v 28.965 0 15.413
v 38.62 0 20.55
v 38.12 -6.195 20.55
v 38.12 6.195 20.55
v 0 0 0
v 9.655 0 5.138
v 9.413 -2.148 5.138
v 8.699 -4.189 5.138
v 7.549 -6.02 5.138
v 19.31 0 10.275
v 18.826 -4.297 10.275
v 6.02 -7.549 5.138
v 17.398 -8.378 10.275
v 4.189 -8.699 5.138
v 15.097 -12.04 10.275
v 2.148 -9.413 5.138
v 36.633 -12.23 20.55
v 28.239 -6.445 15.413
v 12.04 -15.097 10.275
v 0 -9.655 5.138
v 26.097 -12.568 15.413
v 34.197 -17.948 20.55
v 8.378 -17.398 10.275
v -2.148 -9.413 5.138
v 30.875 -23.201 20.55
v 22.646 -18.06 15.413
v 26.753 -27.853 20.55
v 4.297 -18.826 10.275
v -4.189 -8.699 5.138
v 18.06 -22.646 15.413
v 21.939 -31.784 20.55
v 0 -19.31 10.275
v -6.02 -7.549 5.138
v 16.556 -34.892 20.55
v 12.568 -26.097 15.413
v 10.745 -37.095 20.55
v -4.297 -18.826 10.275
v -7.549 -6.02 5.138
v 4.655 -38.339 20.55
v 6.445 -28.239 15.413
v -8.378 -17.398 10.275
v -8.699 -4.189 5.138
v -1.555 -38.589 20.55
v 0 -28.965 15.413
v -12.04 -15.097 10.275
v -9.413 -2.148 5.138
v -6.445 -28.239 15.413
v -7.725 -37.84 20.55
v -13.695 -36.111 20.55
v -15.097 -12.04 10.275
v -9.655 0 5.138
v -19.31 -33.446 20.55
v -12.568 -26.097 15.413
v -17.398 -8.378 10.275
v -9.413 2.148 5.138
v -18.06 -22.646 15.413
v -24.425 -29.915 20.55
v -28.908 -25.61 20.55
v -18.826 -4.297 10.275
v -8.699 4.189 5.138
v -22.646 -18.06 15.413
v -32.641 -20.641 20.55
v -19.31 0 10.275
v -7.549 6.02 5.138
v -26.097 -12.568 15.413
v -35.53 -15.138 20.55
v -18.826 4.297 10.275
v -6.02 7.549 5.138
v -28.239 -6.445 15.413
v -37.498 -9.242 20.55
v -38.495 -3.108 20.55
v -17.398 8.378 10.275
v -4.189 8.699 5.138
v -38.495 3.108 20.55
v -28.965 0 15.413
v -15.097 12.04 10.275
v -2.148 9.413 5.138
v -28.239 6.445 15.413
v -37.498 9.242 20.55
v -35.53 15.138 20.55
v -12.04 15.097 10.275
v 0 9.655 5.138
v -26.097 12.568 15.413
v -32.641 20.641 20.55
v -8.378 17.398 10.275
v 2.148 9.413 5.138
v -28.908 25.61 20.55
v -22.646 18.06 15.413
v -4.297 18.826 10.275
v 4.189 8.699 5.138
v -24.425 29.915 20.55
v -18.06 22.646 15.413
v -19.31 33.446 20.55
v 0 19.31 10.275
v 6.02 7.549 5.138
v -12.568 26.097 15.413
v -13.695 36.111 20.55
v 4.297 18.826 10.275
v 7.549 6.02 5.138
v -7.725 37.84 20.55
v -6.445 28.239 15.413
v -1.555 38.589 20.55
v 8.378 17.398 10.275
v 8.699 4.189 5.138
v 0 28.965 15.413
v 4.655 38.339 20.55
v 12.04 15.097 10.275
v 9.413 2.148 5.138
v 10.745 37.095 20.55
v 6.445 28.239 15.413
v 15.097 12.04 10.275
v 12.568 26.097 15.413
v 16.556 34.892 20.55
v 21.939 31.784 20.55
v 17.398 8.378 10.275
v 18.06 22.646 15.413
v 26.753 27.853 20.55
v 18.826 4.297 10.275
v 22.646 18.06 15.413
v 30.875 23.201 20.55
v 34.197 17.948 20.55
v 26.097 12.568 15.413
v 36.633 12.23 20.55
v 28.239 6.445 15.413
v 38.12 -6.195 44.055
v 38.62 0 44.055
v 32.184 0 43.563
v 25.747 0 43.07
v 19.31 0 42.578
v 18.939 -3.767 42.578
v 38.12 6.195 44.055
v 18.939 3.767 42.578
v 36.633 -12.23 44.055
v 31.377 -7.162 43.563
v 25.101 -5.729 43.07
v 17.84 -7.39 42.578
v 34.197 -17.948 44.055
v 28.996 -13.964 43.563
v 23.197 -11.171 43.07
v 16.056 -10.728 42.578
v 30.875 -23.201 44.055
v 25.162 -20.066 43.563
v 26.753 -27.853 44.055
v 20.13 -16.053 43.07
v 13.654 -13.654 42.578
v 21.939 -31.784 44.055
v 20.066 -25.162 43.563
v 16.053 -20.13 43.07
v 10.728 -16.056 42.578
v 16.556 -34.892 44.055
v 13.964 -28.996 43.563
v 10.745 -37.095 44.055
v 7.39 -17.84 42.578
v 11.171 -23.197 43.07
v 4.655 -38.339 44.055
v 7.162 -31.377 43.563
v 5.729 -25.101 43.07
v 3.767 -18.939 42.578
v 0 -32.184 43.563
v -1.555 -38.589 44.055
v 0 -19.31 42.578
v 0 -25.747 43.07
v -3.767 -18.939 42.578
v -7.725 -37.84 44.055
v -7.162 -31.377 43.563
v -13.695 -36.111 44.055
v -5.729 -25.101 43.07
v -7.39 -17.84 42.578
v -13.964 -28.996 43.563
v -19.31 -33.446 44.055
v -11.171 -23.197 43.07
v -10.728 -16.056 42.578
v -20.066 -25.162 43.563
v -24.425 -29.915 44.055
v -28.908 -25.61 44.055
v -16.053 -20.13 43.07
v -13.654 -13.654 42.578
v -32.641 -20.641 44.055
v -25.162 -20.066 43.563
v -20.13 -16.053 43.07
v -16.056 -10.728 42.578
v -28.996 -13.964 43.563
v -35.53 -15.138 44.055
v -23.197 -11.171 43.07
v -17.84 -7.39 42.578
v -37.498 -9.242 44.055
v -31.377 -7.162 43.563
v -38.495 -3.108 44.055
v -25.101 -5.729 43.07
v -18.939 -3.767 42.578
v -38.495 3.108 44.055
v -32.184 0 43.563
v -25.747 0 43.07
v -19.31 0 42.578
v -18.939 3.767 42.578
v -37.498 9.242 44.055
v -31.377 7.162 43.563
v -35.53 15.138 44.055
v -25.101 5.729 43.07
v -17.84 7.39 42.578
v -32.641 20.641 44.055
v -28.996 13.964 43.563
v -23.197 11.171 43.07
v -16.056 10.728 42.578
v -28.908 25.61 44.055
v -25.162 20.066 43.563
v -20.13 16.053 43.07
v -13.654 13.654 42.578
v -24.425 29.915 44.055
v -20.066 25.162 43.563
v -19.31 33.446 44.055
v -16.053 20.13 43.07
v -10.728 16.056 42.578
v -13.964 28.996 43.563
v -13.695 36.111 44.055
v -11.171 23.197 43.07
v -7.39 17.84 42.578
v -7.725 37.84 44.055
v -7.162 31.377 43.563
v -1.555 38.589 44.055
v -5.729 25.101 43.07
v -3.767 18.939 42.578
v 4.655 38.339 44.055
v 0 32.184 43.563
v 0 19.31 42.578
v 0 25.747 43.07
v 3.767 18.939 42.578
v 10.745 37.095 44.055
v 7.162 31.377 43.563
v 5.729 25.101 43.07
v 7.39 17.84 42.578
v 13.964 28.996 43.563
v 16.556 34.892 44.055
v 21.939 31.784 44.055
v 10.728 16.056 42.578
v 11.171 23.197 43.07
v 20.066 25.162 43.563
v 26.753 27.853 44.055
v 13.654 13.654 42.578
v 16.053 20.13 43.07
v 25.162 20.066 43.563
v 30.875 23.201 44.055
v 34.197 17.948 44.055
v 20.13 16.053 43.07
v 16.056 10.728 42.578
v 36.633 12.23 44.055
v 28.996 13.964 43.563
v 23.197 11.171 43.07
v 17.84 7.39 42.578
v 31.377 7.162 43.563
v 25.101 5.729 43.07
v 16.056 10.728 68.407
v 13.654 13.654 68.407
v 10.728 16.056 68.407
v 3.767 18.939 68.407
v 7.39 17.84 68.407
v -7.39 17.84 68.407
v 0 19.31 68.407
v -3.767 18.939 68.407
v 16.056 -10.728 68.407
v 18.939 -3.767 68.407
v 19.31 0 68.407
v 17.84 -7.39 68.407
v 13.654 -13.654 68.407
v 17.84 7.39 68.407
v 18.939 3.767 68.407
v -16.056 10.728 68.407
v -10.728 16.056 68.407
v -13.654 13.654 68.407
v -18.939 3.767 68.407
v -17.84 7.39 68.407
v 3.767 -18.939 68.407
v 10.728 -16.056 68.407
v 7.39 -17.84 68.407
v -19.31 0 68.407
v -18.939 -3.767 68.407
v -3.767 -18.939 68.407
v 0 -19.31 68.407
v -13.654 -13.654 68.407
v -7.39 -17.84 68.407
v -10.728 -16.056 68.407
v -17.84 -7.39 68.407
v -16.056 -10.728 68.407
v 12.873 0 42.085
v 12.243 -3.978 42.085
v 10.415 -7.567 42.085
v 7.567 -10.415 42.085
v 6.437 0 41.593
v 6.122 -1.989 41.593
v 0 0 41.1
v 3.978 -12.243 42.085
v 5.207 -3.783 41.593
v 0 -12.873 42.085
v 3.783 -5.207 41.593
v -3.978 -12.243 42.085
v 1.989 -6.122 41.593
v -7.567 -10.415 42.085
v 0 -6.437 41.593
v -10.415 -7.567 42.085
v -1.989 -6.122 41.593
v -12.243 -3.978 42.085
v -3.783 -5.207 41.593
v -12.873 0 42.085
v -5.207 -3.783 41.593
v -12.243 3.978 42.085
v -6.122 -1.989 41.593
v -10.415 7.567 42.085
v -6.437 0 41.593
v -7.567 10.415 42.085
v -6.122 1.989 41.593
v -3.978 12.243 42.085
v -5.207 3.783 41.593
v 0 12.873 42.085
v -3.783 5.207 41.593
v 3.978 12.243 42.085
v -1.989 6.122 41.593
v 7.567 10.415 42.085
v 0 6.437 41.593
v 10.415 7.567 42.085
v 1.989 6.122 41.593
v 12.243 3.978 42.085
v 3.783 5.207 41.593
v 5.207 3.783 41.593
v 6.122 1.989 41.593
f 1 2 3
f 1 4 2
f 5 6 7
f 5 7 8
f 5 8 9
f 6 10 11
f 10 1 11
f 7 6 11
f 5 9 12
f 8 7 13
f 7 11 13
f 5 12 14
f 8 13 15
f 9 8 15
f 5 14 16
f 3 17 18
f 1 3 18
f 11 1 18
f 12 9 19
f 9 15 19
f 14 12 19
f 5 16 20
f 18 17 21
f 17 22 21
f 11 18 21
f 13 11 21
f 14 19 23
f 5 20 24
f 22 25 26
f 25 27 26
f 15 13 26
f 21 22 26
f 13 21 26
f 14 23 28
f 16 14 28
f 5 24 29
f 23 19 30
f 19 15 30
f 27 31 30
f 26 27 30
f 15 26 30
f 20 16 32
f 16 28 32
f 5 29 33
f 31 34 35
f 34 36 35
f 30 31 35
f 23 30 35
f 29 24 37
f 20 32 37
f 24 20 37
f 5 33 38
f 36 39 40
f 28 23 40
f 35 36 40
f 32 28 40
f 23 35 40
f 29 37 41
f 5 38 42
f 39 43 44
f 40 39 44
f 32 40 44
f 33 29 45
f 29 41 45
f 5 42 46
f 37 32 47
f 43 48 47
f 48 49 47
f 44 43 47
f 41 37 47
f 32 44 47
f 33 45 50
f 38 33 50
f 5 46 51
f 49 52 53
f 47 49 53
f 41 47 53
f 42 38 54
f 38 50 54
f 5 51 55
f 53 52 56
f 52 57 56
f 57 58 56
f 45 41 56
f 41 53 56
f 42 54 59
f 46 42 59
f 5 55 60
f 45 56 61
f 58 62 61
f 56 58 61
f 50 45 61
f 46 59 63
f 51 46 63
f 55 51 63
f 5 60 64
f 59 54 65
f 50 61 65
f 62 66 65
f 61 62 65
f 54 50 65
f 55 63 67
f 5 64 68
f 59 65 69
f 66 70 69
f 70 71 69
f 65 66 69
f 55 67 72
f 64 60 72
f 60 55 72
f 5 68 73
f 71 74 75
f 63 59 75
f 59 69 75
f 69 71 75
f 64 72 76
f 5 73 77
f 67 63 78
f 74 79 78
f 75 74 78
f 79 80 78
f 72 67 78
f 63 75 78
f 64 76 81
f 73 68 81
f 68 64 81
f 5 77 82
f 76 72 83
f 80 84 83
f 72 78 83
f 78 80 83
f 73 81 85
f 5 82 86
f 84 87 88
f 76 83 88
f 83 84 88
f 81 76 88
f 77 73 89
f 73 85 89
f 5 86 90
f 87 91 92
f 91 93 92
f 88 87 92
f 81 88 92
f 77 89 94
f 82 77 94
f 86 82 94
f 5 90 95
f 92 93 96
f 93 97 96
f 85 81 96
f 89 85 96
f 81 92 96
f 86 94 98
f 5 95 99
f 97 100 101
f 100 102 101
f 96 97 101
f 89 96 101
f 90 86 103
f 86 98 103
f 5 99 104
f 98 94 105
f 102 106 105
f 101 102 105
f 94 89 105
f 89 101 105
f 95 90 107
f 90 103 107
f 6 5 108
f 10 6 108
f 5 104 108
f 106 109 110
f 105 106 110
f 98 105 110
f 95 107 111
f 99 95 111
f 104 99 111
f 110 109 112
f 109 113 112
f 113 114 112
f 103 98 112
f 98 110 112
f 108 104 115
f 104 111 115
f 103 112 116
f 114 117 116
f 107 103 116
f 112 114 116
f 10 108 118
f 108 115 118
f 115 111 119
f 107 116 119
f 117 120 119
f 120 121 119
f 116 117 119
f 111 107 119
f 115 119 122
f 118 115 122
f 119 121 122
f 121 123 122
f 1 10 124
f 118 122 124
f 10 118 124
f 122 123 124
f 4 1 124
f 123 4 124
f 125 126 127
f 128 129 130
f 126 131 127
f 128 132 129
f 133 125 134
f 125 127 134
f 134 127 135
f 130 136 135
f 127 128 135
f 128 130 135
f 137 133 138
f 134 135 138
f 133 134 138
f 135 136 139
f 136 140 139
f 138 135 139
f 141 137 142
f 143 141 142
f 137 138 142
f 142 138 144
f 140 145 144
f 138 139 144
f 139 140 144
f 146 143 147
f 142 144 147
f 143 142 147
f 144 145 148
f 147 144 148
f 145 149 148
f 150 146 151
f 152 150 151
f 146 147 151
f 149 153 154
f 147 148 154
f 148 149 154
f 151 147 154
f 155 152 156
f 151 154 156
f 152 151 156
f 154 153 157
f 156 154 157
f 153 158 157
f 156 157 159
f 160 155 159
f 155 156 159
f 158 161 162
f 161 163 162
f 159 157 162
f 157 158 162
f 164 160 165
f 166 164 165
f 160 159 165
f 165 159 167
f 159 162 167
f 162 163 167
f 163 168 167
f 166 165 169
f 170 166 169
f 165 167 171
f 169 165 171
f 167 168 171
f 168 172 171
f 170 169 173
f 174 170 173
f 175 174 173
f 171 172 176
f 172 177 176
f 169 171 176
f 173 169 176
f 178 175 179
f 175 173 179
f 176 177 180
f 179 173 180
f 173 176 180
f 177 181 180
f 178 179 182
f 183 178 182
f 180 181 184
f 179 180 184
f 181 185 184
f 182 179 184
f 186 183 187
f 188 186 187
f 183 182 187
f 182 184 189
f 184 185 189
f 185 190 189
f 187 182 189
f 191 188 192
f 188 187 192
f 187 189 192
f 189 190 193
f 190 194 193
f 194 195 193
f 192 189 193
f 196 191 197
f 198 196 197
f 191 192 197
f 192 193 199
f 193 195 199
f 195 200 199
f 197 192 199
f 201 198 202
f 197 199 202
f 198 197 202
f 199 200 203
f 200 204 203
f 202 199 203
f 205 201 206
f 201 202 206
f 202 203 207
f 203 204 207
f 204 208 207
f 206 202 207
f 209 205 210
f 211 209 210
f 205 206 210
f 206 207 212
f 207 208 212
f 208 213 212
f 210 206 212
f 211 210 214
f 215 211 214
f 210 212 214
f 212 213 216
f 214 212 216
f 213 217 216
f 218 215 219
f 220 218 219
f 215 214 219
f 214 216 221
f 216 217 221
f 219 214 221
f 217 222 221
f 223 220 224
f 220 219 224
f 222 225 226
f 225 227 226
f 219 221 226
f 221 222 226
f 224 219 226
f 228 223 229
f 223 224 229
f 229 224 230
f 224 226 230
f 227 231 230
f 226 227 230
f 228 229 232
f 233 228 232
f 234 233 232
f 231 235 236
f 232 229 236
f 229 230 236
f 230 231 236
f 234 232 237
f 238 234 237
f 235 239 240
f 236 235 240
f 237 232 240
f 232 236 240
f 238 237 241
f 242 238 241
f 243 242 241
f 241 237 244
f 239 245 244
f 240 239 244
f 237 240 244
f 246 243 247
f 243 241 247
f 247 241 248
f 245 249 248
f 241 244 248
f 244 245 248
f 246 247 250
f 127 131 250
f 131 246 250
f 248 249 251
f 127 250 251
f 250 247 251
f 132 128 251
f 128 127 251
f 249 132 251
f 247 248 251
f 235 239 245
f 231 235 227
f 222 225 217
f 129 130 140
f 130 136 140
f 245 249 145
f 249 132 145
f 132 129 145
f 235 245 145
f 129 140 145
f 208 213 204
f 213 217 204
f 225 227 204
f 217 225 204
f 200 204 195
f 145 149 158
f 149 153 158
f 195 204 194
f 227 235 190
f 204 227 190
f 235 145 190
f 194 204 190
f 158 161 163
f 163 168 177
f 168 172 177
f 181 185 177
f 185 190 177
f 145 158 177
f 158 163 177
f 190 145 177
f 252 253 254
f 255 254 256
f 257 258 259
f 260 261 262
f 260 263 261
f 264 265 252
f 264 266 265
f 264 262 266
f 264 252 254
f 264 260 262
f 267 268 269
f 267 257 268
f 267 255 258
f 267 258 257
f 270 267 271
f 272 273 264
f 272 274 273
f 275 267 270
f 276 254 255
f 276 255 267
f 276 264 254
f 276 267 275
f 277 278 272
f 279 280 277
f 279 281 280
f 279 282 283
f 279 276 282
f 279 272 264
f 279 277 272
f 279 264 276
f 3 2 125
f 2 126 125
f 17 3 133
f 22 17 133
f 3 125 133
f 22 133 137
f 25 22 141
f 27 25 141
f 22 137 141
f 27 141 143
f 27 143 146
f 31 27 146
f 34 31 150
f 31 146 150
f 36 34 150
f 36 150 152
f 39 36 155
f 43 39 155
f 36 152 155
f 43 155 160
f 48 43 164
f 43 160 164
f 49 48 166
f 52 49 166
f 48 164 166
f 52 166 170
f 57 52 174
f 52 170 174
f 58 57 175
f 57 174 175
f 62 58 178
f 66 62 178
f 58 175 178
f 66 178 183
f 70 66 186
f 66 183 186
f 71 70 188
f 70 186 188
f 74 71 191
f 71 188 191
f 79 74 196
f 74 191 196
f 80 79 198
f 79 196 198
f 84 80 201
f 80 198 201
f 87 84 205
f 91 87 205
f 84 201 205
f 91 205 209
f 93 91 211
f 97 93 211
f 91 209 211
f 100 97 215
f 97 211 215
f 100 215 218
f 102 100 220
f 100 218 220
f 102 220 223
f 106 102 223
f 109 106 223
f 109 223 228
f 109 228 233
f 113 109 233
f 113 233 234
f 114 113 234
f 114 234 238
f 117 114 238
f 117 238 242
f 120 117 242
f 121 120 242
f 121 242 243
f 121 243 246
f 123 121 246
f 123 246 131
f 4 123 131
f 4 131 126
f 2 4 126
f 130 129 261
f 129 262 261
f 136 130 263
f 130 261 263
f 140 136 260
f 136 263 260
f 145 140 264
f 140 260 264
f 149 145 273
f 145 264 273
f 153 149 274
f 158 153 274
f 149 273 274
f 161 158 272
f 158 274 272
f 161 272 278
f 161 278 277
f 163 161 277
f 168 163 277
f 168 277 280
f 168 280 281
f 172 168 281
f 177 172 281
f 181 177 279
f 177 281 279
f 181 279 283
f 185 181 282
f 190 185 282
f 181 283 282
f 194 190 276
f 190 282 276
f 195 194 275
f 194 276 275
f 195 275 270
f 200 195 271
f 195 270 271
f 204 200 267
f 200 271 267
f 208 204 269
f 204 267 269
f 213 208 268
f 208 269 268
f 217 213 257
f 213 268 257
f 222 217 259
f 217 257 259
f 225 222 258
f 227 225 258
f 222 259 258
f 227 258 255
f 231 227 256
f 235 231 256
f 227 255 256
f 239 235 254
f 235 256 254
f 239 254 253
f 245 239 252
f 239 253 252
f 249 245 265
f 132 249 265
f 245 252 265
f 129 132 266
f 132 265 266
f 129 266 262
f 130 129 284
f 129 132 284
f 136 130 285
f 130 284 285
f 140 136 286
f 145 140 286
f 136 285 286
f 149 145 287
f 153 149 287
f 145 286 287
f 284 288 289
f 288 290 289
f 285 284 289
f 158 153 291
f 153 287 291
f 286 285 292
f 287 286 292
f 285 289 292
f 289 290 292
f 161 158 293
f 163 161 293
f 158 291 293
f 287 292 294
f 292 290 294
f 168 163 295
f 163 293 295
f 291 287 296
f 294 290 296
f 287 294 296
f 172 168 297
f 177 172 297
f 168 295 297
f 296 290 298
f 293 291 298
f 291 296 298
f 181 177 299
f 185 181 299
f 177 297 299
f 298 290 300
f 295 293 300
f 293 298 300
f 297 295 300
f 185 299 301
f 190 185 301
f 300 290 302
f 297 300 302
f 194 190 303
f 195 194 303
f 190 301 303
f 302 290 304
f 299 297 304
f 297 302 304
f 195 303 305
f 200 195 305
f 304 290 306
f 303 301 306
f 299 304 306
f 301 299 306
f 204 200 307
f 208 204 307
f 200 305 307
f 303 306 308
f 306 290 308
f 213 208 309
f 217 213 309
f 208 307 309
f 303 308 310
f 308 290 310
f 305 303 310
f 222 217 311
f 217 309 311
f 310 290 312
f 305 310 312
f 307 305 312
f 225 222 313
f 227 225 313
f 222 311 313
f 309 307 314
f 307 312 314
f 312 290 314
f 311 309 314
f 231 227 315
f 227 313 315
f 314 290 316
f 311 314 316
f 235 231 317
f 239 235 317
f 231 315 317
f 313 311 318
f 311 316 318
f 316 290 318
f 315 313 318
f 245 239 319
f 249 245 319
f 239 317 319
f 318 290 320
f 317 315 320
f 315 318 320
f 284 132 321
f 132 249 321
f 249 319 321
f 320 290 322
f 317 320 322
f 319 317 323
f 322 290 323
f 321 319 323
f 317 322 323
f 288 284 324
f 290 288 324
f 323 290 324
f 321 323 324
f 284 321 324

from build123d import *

# Parameters (mm, degrees)
F0_W = 19.3101465702
F0_H = 25.8295014501


with BuildPart() as f1:
    # F0 (on Front) → F1 (revolve)
    with BuildSketch(Plane.XZ):
        Polygon((38.6202931404, 20.5500498414), (0, 41.1000996828), (0, 0), align=None)
        Polygon((19.3101465702, 42.5776690245), (0, 41.1000996828), (38.6202931404, 20.5500498414), (38.6202931404, 44.0552383661), align=None)
    revolve(axis=Axis((0, 0, 20.5500498414), (0, 0, -1)))


with BuildPart() as f1b:
    # F0 (on Front) → F1, piece 2 (revolve)
    with BuildSketch(Plane.XZ):
        with Locations((9.6550732851, 55.4924197495)):
            Rectangle(F0_W, F0_H)
    revolve(axis=Axis((0, 0, 20.5500498414), (0, 0, -1)))


solid = Compound([f1.part, f1b.part])
